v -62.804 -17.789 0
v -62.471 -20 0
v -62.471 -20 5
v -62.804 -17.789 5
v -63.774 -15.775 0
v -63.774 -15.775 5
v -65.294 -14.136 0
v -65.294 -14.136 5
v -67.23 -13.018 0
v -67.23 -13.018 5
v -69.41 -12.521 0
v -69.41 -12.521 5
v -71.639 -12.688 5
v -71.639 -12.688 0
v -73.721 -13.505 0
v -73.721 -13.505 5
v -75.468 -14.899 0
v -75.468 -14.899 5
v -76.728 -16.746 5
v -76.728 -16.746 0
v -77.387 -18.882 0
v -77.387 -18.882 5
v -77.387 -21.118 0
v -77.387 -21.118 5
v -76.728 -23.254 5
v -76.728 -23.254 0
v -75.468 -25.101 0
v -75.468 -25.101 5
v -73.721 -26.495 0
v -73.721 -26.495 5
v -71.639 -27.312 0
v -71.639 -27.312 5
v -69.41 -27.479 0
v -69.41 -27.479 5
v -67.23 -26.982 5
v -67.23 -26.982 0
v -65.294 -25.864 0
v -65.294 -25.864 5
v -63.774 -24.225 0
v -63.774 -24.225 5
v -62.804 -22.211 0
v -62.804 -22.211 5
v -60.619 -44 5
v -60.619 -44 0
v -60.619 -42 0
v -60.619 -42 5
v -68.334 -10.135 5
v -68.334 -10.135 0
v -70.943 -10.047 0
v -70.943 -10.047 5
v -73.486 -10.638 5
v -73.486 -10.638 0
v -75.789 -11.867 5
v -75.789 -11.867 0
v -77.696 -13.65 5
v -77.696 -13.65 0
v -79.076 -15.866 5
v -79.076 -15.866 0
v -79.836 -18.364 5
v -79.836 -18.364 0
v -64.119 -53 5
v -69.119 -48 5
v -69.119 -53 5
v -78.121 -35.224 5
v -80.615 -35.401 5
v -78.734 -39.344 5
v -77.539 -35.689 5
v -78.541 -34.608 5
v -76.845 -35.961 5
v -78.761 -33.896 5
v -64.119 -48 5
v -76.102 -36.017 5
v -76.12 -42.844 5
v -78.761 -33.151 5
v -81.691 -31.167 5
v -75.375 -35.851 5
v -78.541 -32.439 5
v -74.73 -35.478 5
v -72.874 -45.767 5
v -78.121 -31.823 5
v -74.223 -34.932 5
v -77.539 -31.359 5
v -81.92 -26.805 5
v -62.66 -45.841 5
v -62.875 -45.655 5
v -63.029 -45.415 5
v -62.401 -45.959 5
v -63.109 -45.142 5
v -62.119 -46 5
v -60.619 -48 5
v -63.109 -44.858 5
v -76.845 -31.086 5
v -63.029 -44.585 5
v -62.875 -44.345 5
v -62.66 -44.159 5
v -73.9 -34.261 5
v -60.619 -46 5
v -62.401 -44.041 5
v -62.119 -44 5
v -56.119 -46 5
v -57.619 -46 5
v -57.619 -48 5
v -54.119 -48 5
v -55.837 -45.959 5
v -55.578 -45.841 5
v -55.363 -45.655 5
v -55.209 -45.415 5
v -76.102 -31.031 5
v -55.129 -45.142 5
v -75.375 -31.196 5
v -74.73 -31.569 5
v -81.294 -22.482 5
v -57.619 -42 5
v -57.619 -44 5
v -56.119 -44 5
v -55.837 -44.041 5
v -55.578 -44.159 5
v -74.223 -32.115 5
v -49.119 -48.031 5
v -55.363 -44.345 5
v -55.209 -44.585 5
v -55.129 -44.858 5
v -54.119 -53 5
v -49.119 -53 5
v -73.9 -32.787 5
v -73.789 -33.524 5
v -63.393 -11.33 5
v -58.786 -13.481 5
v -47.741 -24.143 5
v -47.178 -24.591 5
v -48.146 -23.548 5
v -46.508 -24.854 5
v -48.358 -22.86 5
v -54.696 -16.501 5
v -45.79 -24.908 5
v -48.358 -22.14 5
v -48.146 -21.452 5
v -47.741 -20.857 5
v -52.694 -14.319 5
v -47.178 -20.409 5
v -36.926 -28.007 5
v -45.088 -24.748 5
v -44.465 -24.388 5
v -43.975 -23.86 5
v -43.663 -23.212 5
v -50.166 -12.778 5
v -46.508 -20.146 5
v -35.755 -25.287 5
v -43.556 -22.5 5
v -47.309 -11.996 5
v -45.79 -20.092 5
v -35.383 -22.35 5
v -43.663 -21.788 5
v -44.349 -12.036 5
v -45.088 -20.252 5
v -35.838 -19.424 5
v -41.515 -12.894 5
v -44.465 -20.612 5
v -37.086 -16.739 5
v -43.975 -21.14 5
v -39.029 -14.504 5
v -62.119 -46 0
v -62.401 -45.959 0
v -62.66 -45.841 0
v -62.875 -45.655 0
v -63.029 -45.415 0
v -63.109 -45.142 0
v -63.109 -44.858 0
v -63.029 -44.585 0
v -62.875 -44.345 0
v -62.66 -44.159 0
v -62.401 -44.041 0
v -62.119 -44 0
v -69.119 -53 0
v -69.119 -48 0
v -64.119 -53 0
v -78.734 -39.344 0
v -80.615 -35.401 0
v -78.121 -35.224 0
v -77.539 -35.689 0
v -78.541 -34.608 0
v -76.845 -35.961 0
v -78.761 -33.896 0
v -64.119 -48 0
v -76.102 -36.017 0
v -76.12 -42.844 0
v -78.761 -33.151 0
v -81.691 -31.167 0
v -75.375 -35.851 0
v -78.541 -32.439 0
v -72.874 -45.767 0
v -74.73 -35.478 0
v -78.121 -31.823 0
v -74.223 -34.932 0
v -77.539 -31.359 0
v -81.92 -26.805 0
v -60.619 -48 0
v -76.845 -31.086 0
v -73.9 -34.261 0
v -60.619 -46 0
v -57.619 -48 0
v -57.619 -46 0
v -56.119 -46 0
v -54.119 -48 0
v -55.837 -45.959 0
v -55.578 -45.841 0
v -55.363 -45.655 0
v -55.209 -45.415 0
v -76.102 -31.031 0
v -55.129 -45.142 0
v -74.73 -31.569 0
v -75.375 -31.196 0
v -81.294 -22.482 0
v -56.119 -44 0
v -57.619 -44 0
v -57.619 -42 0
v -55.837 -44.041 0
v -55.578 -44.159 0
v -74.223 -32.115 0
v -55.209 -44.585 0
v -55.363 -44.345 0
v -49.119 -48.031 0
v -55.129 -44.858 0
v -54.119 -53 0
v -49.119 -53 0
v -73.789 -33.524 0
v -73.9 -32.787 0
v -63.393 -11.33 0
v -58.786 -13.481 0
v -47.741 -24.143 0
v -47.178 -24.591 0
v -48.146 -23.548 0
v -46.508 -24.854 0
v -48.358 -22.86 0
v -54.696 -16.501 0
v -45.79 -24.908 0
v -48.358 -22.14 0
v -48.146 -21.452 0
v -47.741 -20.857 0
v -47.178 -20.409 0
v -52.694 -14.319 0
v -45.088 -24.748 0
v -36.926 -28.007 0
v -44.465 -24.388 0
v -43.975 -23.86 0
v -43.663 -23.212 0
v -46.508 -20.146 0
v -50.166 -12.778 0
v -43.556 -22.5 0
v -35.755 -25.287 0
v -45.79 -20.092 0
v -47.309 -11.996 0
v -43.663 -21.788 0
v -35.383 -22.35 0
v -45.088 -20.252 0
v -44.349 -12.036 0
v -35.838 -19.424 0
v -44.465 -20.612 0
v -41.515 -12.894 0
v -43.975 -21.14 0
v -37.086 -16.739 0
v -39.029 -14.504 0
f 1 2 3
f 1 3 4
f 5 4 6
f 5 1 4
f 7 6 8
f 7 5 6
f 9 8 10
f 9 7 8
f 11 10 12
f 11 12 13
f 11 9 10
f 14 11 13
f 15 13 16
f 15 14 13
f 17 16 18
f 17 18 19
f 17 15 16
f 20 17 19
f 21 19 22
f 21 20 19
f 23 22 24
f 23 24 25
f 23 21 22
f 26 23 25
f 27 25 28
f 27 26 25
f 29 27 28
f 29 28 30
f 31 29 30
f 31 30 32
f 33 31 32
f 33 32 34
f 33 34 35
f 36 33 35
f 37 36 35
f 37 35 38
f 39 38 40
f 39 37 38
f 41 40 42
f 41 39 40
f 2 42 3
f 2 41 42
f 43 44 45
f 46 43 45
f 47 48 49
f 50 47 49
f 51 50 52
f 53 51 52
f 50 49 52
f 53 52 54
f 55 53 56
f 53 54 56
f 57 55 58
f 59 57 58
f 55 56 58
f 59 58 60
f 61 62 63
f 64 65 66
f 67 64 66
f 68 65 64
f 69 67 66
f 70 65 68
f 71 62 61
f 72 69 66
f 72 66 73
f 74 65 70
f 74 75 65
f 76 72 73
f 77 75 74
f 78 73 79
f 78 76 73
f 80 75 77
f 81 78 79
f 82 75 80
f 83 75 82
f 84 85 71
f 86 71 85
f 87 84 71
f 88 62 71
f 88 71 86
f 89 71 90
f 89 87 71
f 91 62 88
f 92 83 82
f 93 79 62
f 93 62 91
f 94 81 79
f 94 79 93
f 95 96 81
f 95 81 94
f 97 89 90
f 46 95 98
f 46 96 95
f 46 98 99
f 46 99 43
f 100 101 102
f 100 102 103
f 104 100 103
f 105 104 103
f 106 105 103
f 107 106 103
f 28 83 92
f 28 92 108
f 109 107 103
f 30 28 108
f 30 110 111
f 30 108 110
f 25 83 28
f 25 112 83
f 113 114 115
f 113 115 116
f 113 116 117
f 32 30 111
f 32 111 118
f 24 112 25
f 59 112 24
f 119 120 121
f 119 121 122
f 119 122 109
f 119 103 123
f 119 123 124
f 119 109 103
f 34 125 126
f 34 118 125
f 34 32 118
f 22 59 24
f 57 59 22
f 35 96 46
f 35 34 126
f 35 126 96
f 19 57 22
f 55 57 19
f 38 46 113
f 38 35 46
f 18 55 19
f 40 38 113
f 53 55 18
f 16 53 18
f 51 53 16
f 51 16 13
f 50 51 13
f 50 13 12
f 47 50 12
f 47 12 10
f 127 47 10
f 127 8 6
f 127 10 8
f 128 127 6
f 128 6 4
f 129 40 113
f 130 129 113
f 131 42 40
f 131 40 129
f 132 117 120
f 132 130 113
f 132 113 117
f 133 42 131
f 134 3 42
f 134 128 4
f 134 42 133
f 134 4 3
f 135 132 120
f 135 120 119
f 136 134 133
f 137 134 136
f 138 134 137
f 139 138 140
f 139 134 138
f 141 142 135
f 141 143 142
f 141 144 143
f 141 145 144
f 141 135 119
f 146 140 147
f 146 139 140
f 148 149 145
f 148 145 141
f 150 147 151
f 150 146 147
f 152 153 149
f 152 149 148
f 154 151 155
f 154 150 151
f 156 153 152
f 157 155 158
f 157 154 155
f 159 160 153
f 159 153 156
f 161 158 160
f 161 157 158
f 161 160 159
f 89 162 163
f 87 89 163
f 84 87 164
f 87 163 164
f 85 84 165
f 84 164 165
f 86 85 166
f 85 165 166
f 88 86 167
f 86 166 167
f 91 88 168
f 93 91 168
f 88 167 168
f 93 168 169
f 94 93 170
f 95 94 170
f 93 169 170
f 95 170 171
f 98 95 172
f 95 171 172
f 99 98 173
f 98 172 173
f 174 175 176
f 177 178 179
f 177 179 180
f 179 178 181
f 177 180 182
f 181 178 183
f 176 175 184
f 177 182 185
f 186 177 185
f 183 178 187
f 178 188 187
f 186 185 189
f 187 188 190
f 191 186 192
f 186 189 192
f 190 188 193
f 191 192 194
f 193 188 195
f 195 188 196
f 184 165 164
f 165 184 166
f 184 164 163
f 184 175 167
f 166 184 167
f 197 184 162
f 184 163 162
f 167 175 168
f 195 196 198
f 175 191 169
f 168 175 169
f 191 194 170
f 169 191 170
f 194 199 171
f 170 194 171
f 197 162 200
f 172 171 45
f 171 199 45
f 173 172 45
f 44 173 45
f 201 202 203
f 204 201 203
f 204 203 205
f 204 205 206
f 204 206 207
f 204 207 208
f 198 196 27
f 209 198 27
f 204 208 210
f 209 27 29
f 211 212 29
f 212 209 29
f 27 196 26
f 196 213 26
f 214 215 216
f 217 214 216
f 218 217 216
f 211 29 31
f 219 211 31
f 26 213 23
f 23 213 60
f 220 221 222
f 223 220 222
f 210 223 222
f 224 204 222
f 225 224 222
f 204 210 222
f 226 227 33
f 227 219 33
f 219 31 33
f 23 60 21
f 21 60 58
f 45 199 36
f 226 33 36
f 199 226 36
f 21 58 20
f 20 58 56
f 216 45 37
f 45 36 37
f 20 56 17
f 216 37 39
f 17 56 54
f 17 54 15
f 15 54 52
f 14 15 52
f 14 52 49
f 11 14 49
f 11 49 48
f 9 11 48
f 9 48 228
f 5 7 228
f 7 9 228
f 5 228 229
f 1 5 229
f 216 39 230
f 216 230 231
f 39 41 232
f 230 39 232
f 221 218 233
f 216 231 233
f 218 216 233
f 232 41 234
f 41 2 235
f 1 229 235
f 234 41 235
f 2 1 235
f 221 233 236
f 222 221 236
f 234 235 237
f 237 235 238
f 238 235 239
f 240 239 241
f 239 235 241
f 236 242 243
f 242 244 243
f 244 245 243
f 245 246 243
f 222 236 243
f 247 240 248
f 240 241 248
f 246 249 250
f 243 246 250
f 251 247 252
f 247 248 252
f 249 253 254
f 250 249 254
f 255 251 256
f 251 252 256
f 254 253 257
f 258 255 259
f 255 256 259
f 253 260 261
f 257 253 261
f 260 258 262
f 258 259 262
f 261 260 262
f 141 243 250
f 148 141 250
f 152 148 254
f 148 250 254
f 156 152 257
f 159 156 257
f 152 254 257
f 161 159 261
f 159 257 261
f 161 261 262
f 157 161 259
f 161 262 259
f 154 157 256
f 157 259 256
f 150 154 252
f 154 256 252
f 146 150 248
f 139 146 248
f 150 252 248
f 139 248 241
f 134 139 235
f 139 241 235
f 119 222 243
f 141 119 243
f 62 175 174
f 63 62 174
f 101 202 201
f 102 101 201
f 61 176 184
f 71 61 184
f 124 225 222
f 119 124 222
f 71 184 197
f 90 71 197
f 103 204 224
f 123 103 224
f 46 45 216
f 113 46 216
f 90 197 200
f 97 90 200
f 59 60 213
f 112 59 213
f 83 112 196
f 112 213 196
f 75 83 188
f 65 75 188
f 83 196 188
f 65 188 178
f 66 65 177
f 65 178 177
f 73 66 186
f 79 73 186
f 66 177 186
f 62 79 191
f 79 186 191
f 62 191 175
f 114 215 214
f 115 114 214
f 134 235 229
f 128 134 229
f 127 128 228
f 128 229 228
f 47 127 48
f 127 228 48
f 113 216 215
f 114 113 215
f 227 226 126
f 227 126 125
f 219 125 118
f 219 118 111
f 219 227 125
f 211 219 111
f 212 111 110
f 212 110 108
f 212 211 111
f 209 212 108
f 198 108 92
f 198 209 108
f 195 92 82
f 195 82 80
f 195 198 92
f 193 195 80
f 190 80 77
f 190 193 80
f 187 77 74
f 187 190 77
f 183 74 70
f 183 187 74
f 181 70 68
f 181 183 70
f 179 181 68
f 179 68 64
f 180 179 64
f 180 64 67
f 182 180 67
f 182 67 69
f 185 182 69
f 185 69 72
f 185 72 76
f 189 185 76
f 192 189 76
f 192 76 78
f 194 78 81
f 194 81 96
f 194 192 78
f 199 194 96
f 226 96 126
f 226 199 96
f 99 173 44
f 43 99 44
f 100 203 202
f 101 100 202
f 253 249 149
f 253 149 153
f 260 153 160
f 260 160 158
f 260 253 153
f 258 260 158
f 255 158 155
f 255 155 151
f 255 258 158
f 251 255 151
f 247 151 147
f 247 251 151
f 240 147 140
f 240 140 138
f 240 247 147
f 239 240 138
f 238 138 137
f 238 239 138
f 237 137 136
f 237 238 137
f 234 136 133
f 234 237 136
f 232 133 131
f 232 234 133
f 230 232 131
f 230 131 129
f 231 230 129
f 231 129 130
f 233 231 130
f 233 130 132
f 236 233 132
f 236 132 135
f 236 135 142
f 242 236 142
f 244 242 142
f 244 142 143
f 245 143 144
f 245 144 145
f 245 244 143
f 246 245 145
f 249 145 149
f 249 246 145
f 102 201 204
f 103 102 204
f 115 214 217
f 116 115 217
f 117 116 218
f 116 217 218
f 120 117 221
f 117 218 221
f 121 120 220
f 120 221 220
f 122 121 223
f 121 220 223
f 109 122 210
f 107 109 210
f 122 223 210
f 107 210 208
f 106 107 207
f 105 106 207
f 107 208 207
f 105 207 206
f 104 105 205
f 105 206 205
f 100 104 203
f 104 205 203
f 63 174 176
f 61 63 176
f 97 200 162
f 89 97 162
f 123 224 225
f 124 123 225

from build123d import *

# Parameters (mm, degrees)
SKETCH1_R           = 7.5
SKETCH1_R_2         = 2.5
SKETCH1_R_3         = 2.414891735
BOSS_EXTRUDE1_DEPTH = 5


with BuildPart() as part:
    # Sketch1 → Boss-Extrude1 (new body)
    with BuildSketch(Plane.XY):
        with BuildLine():
            Line((-64.11910774, -48), (-60.619119753, -48))
            Line((-60.619119753, -48), (-60.619119753, -46))
            Line((-60.619119753, -46), (-62.119119753, -46))
            ThreePointArc((-62.119119753, -46), (-63.119119753, -45), (-62.119119753, -44))
            Line((-62.119119753, -44), (-60.619119753, -44))
            Line((-60.619119753, -44), (-60.619119753, -42))
            Line((-60.619119753, -42), (-57.619119753, -42))
            Line((-57.619119753, -42), (-57.619119753, -44))
            Line((-57.619119753, -44), (-56.119119753, -44))
            ThreePointArc((-56.119119753, -44), (-55.119119753, -45), (-56.119119753, -46))
            Line((-56.119119753, -46), (-57.619119753, -46))
            Line((-57.619119753, -46), (-57.619119753, -48))
            Line((-57.619119753, -48), (-54.119131767, -48))
            Line((-54.119131767, -48), (-54.119131767, -53))
            Line((-54.119131767, -53), (-49.119131767, -53))
            Line((-49.119131767, -53), (-49.119131767, -48.03100166))
            Line((-49.119131767, -48.03100166), (-36.926389772, -28.007003911))
            ThreePointArc((-36.926389772, -28.007003911), (-40.215260186, -13.611740859), (-54.696043275, -16.500890917))
            ThreePointArc((-54.696043275, -16.500890917), (-61.035529103, -12.290355564), (-68.334240228, -10.134780364))
            ThreePointArc((-68.334240228, -10.134780364), (-75.789232267, -11.867196487), (-79.835711336, -18.363670844))
            ThreePointArc((-79.835711336, -18.363670844), (-80.615312561, -35.401323311), (-69.11910774, -48))
            Line((-69.11910774, -48), (-69.11910774, -53))
            Line((-69.11910774, -53), (-64.11910774, -53))
            Line((-64.11910774, -53), (-64.11910774, -48))
        make_face()
        with Locations((-69.970521887, -19.999973255)):
            Circle(SKETCH1_R, mode=Mode.SUBTRACT)
        with Locations((-76.288829656, -33.523643473)):
            Circle(SKETCH1_R_2, mode=Mode.SUBTRACT)
        with Locations((-45.970521887, -22.499973255)):
            Circle(SKETCH1_R_3, mode=Mode.SUBTRACT)
    extrude(amount=BOSS_EXTRUDE1_DEPTH)


solid = part.part
